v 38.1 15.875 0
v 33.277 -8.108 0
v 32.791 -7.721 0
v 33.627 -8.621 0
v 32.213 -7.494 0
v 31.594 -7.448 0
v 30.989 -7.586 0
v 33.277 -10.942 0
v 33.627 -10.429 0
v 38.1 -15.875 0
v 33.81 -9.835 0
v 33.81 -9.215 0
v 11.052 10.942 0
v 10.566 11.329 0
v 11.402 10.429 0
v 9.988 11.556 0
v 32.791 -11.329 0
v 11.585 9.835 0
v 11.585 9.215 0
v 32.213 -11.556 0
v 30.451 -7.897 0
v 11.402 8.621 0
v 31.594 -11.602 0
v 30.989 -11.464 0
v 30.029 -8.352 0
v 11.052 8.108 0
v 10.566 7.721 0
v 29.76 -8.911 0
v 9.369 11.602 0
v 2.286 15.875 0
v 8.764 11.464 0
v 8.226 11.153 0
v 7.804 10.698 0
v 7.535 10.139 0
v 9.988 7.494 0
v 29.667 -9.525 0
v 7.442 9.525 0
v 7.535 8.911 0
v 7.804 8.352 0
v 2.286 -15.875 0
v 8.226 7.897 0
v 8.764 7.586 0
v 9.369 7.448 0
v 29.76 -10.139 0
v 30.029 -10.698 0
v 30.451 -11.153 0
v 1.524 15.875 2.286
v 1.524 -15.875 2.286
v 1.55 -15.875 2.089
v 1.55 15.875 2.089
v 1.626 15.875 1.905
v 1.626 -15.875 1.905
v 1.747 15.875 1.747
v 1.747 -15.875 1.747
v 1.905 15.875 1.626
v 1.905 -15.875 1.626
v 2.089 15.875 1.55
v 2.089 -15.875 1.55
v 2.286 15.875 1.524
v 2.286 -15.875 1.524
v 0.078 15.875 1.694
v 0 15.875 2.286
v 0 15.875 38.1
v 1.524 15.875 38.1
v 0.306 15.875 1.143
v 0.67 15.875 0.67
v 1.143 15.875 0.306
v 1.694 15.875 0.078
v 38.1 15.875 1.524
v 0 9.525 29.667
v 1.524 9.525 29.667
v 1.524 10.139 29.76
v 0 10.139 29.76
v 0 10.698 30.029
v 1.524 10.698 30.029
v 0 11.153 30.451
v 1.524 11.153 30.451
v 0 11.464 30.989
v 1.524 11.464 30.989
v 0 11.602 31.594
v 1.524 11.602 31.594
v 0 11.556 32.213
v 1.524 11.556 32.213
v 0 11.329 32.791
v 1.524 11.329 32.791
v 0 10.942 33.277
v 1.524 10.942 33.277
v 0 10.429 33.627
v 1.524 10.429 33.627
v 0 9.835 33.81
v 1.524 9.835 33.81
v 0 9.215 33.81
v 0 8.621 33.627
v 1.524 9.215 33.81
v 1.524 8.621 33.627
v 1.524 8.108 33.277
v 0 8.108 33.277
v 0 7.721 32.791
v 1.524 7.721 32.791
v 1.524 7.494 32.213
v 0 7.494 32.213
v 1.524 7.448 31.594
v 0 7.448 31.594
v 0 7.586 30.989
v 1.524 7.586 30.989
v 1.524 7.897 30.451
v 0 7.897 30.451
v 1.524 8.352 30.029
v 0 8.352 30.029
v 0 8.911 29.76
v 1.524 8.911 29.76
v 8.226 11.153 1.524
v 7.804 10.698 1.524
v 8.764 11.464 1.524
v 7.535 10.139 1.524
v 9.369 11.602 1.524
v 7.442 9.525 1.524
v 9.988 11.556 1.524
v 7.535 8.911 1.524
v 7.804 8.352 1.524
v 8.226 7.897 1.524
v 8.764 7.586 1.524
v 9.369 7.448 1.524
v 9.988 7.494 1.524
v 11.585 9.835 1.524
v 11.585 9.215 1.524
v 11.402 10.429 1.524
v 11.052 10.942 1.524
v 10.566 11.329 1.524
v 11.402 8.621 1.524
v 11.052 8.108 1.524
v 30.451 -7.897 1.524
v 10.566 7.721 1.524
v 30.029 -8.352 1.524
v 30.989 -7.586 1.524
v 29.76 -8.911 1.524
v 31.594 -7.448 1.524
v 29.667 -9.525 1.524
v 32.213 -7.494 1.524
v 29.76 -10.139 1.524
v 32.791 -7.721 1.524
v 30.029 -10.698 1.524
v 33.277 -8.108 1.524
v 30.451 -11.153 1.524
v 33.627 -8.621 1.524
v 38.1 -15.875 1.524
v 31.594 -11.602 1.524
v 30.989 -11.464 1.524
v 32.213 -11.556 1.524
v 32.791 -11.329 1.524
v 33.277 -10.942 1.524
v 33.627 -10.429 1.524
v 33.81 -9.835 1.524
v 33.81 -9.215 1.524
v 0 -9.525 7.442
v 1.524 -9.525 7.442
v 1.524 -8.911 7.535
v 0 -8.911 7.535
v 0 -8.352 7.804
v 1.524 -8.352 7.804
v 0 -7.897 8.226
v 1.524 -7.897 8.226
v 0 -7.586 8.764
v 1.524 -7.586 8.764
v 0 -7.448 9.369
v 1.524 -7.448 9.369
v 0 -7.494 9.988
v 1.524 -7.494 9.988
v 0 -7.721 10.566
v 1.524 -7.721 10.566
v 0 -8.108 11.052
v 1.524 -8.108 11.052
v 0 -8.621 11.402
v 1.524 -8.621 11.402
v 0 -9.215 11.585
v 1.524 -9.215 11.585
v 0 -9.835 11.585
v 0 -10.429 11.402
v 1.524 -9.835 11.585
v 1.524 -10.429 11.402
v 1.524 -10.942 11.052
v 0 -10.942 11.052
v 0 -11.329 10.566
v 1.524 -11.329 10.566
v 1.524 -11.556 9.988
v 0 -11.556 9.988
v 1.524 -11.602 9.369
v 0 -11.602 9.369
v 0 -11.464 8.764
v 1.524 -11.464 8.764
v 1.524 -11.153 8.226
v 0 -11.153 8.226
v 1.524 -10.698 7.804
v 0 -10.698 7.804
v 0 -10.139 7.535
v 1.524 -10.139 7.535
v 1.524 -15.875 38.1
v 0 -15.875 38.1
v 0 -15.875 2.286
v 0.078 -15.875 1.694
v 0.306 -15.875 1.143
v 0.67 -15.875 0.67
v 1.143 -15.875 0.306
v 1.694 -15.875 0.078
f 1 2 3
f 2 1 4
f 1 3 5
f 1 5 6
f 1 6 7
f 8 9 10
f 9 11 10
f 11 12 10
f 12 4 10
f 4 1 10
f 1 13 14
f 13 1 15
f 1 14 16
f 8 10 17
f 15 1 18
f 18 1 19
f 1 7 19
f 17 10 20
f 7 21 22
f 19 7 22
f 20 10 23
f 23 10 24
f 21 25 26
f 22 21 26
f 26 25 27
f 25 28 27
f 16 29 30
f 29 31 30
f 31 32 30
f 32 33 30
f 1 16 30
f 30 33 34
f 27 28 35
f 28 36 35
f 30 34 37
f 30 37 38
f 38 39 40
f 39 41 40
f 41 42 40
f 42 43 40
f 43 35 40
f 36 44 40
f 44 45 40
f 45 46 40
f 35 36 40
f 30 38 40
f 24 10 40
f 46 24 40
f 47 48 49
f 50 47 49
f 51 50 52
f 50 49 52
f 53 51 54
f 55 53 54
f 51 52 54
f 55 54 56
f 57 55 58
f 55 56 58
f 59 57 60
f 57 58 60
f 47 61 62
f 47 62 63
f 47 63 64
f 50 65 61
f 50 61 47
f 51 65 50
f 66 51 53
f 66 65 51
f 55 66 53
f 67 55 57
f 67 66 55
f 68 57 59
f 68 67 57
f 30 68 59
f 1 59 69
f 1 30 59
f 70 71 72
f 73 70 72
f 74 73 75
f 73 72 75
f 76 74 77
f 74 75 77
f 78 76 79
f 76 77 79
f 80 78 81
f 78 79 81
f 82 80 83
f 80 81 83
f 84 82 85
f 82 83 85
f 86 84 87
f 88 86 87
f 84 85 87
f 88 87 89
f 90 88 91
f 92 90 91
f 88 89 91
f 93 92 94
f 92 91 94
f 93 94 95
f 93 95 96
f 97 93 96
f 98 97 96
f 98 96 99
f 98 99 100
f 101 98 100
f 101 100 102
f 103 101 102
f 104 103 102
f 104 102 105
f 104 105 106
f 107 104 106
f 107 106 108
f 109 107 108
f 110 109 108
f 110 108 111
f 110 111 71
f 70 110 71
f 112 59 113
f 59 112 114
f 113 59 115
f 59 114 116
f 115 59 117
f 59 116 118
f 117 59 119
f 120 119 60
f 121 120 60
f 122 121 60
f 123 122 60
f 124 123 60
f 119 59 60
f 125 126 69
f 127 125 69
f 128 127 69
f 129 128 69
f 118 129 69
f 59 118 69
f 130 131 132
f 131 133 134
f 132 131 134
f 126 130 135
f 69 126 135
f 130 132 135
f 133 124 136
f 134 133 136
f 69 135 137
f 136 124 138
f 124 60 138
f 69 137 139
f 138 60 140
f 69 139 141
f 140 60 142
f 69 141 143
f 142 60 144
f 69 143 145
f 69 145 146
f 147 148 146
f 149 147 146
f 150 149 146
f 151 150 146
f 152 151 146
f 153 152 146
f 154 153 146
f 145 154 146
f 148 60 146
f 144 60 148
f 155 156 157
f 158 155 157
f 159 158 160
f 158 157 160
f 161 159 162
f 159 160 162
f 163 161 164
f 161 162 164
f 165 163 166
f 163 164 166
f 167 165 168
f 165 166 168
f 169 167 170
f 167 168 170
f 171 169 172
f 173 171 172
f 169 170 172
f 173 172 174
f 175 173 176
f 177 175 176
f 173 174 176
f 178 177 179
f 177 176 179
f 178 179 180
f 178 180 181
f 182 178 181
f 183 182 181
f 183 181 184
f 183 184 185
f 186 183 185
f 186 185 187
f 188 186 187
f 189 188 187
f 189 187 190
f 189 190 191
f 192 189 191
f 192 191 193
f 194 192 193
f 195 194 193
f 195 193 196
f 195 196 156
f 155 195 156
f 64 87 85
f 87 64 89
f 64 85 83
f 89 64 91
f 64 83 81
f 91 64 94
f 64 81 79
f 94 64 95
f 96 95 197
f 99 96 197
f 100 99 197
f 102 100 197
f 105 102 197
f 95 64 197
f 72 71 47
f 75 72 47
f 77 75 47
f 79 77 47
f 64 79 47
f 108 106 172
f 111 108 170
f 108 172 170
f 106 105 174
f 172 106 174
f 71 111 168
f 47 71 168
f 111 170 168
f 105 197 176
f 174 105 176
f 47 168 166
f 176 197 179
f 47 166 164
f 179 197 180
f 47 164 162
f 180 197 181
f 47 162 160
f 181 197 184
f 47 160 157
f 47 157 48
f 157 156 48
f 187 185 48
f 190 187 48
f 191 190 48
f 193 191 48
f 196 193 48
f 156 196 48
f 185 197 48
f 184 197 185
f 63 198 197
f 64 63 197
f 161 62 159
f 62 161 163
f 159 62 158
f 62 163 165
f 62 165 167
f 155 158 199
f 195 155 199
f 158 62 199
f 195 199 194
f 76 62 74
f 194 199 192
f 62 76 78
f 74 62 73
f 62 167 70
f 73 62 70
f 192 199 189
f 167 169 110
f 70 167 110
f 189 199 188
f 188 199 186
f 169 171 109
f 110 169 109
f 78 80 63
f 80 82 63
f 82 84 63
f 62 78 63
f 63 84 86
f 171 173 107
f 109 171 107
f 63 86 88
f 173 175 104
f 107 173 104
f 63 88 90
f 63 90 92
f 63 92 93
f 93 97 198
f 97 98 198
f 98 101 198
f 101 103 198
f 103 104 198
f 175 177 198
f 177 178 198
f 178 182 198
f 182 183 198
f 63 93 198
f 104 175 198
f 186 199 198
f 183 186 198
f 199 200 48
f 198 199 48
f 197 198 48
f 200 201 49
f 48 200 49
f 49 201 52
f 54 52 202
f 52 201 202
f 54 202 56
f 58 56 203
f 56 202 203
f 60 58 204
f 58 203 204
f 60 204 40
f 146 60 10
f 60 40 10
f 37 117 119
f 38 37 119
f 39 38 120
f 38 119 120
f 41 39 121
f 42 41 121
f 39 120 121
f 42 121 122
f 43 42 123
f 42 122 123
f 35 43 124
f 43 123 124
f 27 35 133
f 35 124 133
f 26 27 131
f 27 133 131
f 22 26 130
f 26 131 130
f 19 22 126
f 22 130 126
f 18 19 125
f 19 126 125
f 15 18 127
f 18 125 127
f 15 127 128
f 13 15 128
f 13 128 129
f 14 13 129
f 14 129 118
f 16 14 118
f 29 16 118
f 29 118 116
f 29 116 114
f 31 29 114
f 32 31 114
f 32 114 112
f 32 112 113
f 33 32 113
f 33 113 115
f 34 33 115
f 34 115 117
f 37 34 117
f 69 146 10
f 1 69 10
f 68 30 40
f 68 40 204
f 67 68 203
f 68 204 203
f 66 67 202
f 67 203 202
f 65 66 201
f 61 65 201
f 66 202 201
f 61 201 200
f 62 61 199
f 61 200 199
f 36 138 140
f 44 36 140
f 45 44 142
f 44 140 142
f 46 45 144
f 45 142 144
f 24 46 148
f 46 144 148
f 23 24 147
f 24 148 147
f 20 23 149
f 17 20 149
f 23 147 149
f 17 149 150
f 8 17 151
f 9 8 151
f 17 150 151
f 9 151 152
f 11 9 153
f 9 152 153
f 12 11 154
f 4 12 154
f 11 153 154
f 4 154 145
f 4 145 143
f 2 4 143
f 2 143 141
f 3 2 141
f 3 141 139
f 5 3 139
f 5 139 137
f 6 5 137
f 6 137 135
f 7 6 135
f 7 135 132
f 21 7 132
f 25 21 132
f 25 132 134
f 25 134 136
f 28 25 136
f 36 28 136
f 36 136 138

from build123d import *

# Parameters (mm, degrees)
EXTRUDE_THIN1_START = -15.875
EXTRUDE_THIN1_DEPTH = 31.75
SKETCH4_R           = 2.0828
EXTRUDE3_DEPTH      = 56.149155941
CIRPATTERN1_COUNT   = 2


# Read off the part's stored shape, not the designer's step: Extrude-Thin1
with BuildPart() as part:
    # Extrude-Thin1 outline → Extrude-Thin1 (new body)
    with BuildSketch(Plane(origin=(0, 0, 0), x_dir=(1, 0, 0), z_dir=(0, 1, 0)).offset(EXTRUDE_THIN1_START)):
        with BuildLine():
            Line((2.286, -1.524), (38.1, -1.524))
            Line((38.1, -1.524), (38.1, 0))
            Line((38.1, 0), (2.286, 0))
            ThreePointArc((2.286, 0), (0.669553898, -0.669553898), (0, -2.286))
            Line((0, -2.286), (0, -38.1))
            Line((0, -38.1), (1.524, -38.1))
            Line((1.524, -38.1), (1.524, -2.286))
            ThreePointArc((1.524, -2.286), (1.747184633, -1.747184633), (2.286, -1.524))
        make_face()
    extrude(amount=EXTRUDE_THIN1_DEPTH)

    # Sketch4 → Extrude3 (cut, through all)
    with BuildSketch(Plane(origin=(1.524, 0, 0), x_dir=(0, 0, -1), z_dir=(1, 0, 0))):
        with Locations((-31.75, 60.325)):
            Circle(SKETCH4_R)
        with Locations((-9.525, 41.275)):
            Circle(SKETCH4_R)
        with Locations((-9.525, -9.525)):
            Circle(SKETCH4_R)
        with Locations((-31.75, 9.525)):
            Circle(SKETCH4_R)
    extrude3 = extrude(amount=-EXTRUDE3_DEPTH, mode=Mode.SUBTRACT)

    # CirPattern1: Extrude3 ×2 about axis
    cirpattern1_axis = Axis((0, 0, 0), (0.7071067811865464, 0, 0.7071067811865487))
    for i in range(1, CIRPATTERN1_COUNT):
        add(extrude3.rotate(cirpattern1_axis, i * 360 / CIRPATTERN1_COUNT), mode=Mode.SUBTRACT)


solid = part.part
